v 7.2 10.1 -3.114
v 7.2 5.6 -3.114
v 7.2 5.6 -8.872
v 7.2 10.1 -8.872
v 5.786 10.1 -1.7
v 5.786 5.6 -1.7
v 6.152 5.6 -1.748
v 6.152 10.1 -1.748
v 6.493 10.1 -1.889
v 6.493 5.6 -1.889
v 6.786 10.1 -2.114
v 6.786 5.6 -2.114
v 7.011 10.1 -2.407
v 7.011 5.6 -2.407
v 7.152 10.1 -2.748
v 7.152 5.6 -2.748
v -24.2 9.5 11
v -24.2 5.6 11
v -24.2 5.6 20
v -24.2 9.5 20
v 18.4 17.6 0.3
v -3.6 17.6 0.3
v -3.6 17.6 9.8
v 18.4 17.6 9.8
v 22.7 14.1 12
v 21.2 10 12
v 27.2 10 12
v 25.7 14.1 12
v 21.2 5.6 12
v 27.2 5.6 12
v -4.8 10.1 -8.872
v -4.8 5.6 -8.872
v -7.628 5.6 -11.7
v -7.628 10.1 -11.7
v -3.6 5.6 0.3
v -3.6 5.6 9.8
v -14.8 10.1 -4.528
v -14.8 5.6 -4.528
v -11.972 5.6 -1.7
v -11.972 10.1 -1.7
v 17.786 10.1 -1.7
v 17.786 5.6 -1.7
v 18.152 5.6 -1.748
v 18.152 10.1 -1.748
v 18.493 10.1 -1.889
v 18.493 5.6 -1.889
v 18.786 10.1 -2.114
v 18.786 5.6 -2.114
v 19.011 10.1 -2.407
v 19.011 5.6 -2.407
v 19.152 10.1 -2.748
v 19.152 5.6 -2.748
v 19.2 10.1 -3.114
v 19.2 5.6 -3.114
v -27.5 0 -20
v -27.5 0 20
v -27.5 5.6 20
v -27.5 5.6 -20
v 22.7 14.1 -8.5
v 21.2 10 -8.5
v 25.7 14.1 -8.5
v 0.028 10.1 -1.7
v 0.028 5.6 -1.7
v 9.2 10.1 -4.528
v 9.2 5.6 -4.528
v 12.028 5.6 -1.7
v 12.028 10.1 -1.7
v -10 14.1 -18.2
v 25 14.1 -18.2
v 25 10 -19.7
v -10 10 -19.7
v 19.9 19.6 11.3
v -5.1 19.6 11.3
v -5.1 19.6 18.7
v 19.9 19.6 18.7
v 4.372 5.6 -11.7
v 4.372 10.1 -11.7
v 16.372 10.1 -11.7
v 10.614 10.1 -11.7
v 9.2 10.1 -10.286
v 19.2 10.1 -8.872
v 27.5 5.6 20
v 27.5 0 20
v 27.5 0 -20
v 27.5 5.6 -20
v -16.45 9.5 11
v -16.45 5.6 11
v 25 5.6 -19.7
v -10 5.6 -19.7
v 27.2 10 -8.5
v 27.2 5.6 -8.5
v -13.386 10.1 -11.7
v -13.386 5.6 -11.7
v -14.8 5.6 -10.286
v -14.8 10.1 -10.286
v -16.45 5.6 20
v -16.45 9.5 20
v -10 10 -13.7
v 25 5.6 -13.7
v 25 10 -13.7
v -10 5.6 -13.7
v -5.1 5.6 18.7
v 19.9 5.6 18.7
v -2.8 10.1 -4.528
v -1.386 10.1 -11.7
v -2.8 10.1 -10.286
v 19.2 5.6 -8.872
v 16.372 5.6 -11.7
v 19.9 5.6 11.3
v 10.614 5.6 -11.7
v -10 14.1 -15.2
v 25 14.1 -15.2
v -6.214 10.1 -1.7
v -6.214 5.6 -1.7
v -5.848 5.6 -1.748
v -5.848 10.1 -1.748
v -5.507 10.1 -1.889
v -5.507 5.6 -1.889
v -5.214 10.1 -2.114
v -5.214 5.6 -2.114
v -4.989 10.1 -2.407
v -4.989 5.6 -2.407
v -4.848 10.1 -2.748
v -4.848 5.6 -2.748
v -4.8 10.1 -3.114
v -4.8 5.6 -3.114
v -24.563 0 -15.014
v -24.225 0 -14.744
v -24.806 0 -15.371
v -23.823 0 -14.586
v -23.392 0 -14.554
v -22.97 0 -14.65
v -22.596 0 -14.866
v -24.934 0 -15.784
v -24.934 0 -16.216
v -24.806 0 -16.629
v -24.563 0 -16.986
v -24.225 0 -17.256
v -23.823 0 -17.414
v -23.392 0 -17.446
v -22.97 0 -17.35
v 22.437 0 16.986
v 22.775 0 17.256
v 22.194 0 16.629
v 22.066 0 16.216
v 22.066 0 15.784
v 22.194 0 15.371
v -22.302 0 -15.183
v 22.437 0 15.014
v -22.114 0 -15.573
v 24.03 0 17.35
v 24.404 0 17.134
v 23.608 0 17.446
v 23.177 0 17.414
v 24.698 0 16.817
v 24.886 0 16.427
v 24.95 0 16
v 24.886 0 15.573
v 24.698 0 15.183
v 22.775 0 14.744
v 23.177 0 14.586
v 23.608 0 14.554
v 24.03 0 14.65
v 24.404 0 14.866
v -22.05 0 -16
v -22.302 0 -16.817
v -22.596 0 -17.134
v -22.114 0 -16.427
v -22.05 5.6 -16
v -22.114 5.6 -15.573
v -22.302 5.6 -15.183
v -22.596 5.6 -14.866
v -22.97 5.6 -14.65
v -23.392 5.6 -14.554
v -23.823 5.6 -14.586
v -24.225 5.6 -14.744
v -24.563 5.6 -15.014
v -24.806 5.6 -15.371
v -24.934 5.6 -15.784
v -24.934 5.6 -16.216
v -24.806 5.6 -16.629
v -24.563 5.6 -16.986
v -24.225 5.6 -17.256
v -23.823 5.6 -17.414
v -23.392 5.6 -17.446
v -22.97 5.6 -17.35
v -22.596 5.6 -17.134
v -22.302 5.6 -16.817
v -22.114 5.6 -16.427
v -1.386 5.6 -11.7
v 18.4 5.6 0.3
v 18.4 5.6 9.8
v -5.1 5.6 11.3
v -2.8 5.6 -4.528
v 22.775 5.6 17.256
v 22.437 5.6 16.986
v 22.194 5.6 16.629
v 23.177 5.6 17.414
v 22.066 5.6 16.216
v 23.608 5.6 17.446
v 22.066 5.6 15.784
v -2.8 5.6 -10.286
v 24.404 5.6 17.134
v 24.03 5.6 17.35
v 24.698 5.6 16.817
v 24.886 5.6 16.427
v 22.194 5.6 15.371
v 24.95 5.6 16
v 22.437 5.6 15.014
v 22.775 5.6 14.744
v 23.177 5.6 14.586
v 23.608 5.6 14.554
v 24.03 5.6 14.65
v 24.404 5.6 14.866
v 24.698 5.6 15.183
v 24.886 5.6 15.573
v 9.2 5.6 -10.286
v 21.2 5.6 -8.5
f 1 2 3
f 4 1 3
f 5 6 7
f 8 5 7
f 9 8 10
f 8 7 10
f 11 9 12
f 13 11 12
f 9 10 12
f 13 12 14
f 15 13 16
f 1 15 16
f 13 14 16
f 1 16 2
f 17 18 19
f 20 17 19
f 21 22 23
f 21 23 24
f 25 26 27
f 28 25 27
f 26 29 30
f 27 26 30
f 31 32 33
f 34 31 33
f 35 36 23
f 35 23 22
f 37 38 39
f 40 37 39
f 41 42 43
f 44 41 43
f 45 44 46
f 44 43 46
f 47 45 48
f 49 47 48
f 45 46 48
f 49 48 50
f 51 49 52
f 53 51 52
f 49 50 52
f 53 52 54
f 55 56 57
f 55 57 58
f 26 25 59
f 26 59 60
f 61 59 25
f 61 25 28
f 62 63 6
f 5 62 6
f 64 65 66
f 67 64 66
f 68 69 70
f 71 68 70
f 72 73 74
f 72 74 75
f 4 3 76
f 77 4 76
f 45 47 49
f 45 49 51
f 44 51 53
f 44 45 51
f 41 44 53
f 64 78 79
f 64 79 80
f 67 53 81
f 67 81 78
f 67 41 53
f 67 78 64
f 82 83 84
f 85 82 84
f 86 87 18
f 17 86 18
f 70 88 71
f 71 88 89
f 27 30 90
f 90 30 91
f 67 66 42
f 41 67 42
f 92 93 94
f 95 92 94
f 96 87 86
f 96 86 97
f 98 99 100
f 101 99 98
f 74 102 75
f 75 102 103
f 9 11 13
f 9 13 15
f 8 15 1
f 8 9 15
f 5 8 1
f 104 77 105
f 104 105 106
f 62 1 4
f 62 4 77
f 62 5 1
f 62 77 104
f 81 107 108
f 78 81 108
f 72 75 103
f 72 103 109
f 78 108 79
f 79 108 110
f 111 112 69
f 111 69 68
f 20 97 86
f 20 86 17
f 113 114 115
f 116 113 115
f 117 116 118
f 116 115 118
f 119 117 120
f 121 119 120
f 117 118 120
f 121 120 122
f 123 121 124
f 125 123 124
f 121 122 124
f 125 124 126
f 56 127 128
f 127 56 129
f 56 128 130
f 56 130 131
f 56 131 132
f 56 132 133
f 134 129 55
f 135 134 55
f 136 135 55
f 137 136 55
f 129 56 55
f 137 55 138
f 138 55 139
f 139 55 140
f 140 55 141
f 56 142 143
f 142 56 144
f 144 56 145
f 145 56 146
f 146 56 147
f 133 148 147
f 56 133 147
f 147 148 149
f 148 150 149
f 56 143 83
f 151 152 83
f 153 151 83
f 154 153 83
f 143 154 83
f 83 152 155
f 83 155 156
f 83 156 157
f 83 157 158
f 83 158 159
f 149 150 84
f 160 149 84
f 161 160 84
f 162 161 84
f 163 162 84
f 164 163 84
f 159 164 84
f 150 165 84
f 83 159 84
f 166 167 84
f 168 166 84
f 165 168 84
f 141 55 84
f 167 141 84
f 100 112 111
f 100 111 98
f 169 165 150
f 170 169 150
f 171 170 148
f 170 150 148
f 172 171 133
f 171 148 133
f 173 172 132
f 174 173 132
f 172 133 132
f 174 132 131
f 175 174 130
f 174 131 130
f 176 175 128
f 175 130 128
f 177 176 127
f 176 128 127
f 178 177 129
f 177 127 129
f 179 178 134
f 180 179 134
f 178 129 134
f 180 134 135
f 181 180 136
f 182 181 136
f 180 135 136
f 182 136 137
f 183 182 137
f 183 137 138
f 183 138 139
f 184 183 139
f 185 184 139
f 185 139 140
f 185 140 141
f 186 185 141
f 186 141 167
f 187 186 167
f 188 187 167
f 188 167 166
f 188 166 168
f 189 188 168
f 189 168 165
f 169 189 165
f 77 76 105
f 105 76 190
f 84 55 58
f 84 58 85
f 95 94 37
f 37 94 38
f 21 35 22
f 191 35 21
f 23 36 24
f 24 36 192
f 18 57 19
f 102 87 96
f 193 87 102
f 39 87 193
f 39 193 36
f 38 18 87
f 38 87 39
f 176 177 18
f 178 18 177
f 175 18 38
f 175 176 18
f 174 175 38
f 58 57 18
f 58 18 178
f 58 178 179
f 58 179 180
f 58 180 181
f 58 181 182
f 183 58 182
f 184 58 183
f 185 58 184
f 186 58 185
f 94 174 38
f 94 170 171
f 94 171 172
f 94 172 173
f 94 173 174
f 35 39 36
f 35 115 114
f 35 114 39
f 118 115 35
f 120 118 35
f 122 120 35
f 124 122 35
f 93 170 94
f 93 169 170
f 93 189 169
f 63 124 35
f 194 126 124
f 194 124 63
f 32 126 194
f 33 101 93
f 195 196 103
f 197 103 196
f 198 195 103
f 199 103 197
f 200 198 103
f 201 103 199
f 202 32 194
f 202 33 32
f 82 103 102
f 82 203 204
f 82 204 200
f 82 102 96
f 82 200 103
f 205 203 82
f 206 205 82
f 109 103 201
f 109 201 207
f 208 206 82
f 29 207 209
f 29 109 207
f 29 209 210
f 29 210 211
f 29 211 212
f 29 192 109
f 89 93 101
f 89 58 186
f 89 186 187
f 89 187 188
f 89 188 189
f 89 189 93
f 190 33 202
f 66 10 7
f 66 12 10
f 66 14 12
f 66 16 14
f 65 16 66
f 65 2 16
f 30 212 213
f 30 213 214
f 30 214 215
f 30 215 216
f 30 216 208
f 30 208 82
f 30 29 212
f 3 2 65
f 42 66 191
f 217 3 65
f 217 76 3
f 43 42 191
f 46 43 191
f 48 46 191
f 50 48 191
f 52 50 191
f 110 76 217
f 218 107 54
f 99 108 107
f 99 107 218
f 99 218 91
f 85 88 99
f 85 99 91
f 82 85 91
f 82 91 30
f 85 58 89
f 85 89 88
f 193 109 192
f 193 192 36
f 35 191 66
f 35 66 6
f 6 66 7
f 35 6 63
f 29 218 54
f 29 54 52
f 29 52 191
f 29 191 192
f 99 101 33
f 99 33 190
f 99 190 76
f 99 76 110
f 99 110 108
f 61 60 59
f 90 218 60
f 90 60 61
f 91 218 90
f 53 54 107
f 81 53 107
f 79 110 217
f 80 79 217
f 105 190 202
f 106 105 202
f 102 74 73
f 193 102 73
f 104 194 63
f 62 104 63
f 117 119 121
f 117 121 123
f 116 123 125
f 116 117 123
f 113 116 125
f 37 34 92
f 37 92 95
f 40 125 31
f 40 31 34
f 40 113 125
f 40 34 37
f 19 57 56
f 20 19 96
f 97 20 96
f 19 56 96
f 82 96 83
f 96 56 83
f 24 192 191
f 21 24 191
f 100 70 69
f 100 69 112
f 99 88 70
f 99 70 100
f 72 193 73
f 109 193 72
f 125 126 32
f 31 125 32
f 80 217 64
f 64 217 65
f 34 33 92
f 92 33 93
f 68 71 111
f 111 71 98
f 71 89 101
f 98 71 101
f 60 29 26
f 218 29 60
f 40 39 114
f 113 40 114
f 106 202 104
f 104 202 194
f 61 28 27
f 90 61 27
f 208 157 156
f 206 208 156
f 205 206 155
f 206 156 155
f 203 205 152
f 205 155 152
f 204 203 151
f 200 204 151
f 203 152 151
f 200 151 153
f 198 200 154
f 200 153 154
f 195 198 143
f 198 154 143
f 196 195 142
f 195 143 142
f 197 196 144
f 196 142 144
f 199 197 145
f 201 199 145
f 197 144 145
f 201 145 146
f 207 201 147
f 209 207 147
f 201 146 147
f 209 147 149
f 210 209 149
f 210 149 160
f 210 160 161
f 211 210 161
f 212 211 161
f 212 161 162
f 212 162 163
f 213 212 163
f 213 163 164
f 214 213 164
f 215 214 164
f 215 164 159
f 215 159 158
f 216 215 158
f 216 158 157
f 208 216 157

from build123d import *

# Parameters (mm, degrees)
SKETCH1_W              = 55
SKETCH1_H              = 40
BOSS_EXTRUDE1_DEPTH    = 5.6
M2_5_CLEARANCE_HOLE1_D = 2.9
SKETCH5_W              = 25
SKETCH5_H              = 7.4
BOSS_EXTRUDE2_DEPTH    = 14
SKETCH6_W              = 6
SKETCH6_H              = 20.5
BOSS_EXTRUDE3_DEPTH    = 8.5
CUT_EXTRUDE1_REACH     = 48.523
SKETCH8_W              = 35
SKETCH8_H              = 6
BOSS_EXTRUDE4_DEPTH    = 8.5
CUT_EXTRUDE2_REACH     = 61.501
SKETCH10_W             = 22
SKETCH10_H             = 9.5
BOSS_EXTRUDE5_DEPTH    = 12
BOSS_EXTRUDE6_DEPTH    = 4.5
LPATTERN1_COUNT        = 3
LPATTERN1_PITCH        = 12
SKETCH12_W             = 7.75
SKETCH12_H             = 9
BOSS_EXTRUDE7_DEPTH    = 3.9


with BuildPart() as part:
    # Sketch1 → Boss-Extrude1 (new body)
    with BuildSketch(Plane(origin=(0, 0, 0), x_dir=(1, 0, 0), z_dir=(0, 1, 0))):
        Rectangle(SKETCH1_W, SKETCH1_H)
    extrude(amount=BOSS_EXTRUDE1_DEPTH)

    # M2.5 Clearance Hole1 (through all)
    with Locations(Plane(origin=(0, 5.6, 0), x_dir=(-1, 0, 0), z_dir=(0, 1, 0))):
        with Locations((23.5, -16), (-23.5, 16)):
            Hole(M2_5_CLEARANCE_HOLE1_D / 2)

    # Sketch5 → Boss-Extrude2 (add)
    with BuildSketch(Plane(origin=(0, 5.6, 0), x_dir=(1, 0, 0), z_dir=(0, 1, 0))):
        with Locations((7.4, -15)):
            Rectangle(SKETCH5_W, SKETCH5_H)
    extrude(amount=BOSS_EXTRUDE2_DEPTH)

    # Sketch6 → Boss-Extrude3 (add)
    with BuildSketch(Plane(origin=(0, 5.6, 0), x_dir=(1, 0, 0), z_dir=(0, 1, 0))):
        with Locations((24.2, -1.75)):
            Rectangle(SKETCH6_W, SKETCH6_H)
    extrude(amount=BOSS_EXTRUDE3_DEPTH)

    # Sketch7 → Cut-Extrude1 (cut, up to next)
    with BuildSketch(Plane.XY.offset(12), mode=Mode.PRIVATE) as cut_extrude1_sk1:
        Polygon((25.7, 14.1), (27.2, 10), (27.2, 14.1), align=None)
    cut_extrude1_tool1 = extrude(cut_extrude1_sk1.sketch, amount=-CUT_EXTRUDE1_REACH, mode=Mode.PRIVATE) & part.part
    # Sketch7 → Cut-Extrude1 (cut, up to next)
    with BuildSketch(Plane.XY.offset(12), mode=Mode.PRIVATE) as cut_extrude1_sk2:
        Polygon((22.7, 14.1), (21.2, 10), (21.2, 14.1), align=None)
    cut_extrude1_tool2 = extrude(cut_extrude1_sk2.sketch, amount=-CUT_EXTRUDE1_REACH, mode=Mode.PRIVATE) & part.part
    add(cut_extrude1_tool1.solids().sort_by_distance((26.7, 12.733333, 12))[0], mode=Mode.SUBTRACT)
    add(cut_extrude1_tool2.solids().sort_by_distance((21.7, 12.733333, 12))[0], mode=Mode.SUBTRACT)

    # Sketch8 → Boss-Extrude4 (add)
    with BuildSketch(Plane(origin=(0, 5.6, 0), x_dir=(-1, 0, 0), z_dir=(0, 1, 0))):
        with Locations((-7.5, -16.7)):
            Rectangle(SKETCH8_W, SKETCH8_H)
    extrude(amount=BOSS_EXTRUDE4_DEPTH)

    # Sketch9 → Cut-Extrude2 (cut, up to next)
    with BuildSketch(Plane(origin=(25, 0, 0), x_dir=(0, 0, -1), z_dir=(1, 0, 0)), mode=Mode.PRIVATE) as cut_extrude2_sk1:
        Polygon((18.2, 14.1), (19.7, 10), (19.7, 14.1), align=None)
    cut_extrude2_tool1 = extrude(cut_extrude2_sk1.sketch, amount=-CUT_EXTRUDE2_REACH, mode=Mode.PRIVATE) & part.part
    # Sketch9 → Cut-Extrude2 (cut, up to next)
    with BuildSketch(Plane(origin=(25, 0, 0), x_dir=(0, 0, -1), z_dir=(1, 0, 0)), mode=Mode.PRIVATE) as cut_extrude2_sk2:
        Polygon((15.2, 14.1), (13.7, 10), (13.7, 14.1), align=None)
    cut_extrude2_tool2 = extrude(cut_extrude2_sk2.sketch, amount=-CUT_EXTRUDE2_REACH, mode=Mode.PRIVATE) & part.part
    add(cut_extrude2_tool1.solids().sort_by_distance((25, 12.733333, -19.2))[0], mode=Mode.SUBTRACT)
    add(cut_extrude2_tool2.solids().sort_by_distance((25, 12.733333, -14.2))[0], mode=Mode.SUBTRACT)

    # Sketch10 → Boss-Extrude5 (add)
    with BuildSketch(Plane(origin=(0, 5.6, 0), x_dir=(1, 0, 0), z_dir=(0, 1, 0))):
        with Locations((7.4, -5.05)):
            Rectangle(SKETCH10_W, SKETCH10_H)
    extrude(amount=BOSS_EXTRUDE5_DEPTH)

    # Sketch11 → Boss-Extrude6 (add)
    with BuildSketch(Plane(origin=(0, 5.6, 0), x_dir=(-1, 0, 0), z_dir=(0, 1, 0))):
        with BuildLine():
            Line((-19.2, -3.114213562), (-19.2, -8.871572875))
            Line((-19.2, -8.871572875), (-16.371572875, -11.7))
            Line((-16.371572875, -11.7), (-10.614213562, -11.7))
            Line((-10.614213562, -11.7), (-9.2, -10.285786438))
            Line((-9.2, -10.285786438), (-9.2, -4.528427125))
            Line((-9.2, -4.528427125), (-12.028427125, -1.7))
            Line((-12.028427125, -1.7), (-17.785786438, -1.7))
            ThreePointArc((-17.785786438, -1.7), (-18.785786438, -2.114213562), (-19.2, -3.114213562))
        make_face()
    boss_extrude6 = extrude(amount=BOSS_EXTRUDE6_DEPTH)

    # LPattern1: Boss-Extrude6 ×3
    with Locations(*[(-i * LPATTERN1_PITCH, 0, 0) for i in range(1, LPATTERN1_COUNT)]):
        add(boss_extrude6)

    # Sketch12 → Boss-Extrude7 (add)
    with BuildSketch(Plane(origin=(0, 5.6, 0), x_dir=(-1, 0, 0), z_dir=(0, 1, 0))):
        with Locations((20.325, 15.5)):
            Rectangle(SKETCH12_W, SKETCH12_H)
    extrude(amount=BOSS_EXTRUDE7_DEPTH)


solid = part.part
